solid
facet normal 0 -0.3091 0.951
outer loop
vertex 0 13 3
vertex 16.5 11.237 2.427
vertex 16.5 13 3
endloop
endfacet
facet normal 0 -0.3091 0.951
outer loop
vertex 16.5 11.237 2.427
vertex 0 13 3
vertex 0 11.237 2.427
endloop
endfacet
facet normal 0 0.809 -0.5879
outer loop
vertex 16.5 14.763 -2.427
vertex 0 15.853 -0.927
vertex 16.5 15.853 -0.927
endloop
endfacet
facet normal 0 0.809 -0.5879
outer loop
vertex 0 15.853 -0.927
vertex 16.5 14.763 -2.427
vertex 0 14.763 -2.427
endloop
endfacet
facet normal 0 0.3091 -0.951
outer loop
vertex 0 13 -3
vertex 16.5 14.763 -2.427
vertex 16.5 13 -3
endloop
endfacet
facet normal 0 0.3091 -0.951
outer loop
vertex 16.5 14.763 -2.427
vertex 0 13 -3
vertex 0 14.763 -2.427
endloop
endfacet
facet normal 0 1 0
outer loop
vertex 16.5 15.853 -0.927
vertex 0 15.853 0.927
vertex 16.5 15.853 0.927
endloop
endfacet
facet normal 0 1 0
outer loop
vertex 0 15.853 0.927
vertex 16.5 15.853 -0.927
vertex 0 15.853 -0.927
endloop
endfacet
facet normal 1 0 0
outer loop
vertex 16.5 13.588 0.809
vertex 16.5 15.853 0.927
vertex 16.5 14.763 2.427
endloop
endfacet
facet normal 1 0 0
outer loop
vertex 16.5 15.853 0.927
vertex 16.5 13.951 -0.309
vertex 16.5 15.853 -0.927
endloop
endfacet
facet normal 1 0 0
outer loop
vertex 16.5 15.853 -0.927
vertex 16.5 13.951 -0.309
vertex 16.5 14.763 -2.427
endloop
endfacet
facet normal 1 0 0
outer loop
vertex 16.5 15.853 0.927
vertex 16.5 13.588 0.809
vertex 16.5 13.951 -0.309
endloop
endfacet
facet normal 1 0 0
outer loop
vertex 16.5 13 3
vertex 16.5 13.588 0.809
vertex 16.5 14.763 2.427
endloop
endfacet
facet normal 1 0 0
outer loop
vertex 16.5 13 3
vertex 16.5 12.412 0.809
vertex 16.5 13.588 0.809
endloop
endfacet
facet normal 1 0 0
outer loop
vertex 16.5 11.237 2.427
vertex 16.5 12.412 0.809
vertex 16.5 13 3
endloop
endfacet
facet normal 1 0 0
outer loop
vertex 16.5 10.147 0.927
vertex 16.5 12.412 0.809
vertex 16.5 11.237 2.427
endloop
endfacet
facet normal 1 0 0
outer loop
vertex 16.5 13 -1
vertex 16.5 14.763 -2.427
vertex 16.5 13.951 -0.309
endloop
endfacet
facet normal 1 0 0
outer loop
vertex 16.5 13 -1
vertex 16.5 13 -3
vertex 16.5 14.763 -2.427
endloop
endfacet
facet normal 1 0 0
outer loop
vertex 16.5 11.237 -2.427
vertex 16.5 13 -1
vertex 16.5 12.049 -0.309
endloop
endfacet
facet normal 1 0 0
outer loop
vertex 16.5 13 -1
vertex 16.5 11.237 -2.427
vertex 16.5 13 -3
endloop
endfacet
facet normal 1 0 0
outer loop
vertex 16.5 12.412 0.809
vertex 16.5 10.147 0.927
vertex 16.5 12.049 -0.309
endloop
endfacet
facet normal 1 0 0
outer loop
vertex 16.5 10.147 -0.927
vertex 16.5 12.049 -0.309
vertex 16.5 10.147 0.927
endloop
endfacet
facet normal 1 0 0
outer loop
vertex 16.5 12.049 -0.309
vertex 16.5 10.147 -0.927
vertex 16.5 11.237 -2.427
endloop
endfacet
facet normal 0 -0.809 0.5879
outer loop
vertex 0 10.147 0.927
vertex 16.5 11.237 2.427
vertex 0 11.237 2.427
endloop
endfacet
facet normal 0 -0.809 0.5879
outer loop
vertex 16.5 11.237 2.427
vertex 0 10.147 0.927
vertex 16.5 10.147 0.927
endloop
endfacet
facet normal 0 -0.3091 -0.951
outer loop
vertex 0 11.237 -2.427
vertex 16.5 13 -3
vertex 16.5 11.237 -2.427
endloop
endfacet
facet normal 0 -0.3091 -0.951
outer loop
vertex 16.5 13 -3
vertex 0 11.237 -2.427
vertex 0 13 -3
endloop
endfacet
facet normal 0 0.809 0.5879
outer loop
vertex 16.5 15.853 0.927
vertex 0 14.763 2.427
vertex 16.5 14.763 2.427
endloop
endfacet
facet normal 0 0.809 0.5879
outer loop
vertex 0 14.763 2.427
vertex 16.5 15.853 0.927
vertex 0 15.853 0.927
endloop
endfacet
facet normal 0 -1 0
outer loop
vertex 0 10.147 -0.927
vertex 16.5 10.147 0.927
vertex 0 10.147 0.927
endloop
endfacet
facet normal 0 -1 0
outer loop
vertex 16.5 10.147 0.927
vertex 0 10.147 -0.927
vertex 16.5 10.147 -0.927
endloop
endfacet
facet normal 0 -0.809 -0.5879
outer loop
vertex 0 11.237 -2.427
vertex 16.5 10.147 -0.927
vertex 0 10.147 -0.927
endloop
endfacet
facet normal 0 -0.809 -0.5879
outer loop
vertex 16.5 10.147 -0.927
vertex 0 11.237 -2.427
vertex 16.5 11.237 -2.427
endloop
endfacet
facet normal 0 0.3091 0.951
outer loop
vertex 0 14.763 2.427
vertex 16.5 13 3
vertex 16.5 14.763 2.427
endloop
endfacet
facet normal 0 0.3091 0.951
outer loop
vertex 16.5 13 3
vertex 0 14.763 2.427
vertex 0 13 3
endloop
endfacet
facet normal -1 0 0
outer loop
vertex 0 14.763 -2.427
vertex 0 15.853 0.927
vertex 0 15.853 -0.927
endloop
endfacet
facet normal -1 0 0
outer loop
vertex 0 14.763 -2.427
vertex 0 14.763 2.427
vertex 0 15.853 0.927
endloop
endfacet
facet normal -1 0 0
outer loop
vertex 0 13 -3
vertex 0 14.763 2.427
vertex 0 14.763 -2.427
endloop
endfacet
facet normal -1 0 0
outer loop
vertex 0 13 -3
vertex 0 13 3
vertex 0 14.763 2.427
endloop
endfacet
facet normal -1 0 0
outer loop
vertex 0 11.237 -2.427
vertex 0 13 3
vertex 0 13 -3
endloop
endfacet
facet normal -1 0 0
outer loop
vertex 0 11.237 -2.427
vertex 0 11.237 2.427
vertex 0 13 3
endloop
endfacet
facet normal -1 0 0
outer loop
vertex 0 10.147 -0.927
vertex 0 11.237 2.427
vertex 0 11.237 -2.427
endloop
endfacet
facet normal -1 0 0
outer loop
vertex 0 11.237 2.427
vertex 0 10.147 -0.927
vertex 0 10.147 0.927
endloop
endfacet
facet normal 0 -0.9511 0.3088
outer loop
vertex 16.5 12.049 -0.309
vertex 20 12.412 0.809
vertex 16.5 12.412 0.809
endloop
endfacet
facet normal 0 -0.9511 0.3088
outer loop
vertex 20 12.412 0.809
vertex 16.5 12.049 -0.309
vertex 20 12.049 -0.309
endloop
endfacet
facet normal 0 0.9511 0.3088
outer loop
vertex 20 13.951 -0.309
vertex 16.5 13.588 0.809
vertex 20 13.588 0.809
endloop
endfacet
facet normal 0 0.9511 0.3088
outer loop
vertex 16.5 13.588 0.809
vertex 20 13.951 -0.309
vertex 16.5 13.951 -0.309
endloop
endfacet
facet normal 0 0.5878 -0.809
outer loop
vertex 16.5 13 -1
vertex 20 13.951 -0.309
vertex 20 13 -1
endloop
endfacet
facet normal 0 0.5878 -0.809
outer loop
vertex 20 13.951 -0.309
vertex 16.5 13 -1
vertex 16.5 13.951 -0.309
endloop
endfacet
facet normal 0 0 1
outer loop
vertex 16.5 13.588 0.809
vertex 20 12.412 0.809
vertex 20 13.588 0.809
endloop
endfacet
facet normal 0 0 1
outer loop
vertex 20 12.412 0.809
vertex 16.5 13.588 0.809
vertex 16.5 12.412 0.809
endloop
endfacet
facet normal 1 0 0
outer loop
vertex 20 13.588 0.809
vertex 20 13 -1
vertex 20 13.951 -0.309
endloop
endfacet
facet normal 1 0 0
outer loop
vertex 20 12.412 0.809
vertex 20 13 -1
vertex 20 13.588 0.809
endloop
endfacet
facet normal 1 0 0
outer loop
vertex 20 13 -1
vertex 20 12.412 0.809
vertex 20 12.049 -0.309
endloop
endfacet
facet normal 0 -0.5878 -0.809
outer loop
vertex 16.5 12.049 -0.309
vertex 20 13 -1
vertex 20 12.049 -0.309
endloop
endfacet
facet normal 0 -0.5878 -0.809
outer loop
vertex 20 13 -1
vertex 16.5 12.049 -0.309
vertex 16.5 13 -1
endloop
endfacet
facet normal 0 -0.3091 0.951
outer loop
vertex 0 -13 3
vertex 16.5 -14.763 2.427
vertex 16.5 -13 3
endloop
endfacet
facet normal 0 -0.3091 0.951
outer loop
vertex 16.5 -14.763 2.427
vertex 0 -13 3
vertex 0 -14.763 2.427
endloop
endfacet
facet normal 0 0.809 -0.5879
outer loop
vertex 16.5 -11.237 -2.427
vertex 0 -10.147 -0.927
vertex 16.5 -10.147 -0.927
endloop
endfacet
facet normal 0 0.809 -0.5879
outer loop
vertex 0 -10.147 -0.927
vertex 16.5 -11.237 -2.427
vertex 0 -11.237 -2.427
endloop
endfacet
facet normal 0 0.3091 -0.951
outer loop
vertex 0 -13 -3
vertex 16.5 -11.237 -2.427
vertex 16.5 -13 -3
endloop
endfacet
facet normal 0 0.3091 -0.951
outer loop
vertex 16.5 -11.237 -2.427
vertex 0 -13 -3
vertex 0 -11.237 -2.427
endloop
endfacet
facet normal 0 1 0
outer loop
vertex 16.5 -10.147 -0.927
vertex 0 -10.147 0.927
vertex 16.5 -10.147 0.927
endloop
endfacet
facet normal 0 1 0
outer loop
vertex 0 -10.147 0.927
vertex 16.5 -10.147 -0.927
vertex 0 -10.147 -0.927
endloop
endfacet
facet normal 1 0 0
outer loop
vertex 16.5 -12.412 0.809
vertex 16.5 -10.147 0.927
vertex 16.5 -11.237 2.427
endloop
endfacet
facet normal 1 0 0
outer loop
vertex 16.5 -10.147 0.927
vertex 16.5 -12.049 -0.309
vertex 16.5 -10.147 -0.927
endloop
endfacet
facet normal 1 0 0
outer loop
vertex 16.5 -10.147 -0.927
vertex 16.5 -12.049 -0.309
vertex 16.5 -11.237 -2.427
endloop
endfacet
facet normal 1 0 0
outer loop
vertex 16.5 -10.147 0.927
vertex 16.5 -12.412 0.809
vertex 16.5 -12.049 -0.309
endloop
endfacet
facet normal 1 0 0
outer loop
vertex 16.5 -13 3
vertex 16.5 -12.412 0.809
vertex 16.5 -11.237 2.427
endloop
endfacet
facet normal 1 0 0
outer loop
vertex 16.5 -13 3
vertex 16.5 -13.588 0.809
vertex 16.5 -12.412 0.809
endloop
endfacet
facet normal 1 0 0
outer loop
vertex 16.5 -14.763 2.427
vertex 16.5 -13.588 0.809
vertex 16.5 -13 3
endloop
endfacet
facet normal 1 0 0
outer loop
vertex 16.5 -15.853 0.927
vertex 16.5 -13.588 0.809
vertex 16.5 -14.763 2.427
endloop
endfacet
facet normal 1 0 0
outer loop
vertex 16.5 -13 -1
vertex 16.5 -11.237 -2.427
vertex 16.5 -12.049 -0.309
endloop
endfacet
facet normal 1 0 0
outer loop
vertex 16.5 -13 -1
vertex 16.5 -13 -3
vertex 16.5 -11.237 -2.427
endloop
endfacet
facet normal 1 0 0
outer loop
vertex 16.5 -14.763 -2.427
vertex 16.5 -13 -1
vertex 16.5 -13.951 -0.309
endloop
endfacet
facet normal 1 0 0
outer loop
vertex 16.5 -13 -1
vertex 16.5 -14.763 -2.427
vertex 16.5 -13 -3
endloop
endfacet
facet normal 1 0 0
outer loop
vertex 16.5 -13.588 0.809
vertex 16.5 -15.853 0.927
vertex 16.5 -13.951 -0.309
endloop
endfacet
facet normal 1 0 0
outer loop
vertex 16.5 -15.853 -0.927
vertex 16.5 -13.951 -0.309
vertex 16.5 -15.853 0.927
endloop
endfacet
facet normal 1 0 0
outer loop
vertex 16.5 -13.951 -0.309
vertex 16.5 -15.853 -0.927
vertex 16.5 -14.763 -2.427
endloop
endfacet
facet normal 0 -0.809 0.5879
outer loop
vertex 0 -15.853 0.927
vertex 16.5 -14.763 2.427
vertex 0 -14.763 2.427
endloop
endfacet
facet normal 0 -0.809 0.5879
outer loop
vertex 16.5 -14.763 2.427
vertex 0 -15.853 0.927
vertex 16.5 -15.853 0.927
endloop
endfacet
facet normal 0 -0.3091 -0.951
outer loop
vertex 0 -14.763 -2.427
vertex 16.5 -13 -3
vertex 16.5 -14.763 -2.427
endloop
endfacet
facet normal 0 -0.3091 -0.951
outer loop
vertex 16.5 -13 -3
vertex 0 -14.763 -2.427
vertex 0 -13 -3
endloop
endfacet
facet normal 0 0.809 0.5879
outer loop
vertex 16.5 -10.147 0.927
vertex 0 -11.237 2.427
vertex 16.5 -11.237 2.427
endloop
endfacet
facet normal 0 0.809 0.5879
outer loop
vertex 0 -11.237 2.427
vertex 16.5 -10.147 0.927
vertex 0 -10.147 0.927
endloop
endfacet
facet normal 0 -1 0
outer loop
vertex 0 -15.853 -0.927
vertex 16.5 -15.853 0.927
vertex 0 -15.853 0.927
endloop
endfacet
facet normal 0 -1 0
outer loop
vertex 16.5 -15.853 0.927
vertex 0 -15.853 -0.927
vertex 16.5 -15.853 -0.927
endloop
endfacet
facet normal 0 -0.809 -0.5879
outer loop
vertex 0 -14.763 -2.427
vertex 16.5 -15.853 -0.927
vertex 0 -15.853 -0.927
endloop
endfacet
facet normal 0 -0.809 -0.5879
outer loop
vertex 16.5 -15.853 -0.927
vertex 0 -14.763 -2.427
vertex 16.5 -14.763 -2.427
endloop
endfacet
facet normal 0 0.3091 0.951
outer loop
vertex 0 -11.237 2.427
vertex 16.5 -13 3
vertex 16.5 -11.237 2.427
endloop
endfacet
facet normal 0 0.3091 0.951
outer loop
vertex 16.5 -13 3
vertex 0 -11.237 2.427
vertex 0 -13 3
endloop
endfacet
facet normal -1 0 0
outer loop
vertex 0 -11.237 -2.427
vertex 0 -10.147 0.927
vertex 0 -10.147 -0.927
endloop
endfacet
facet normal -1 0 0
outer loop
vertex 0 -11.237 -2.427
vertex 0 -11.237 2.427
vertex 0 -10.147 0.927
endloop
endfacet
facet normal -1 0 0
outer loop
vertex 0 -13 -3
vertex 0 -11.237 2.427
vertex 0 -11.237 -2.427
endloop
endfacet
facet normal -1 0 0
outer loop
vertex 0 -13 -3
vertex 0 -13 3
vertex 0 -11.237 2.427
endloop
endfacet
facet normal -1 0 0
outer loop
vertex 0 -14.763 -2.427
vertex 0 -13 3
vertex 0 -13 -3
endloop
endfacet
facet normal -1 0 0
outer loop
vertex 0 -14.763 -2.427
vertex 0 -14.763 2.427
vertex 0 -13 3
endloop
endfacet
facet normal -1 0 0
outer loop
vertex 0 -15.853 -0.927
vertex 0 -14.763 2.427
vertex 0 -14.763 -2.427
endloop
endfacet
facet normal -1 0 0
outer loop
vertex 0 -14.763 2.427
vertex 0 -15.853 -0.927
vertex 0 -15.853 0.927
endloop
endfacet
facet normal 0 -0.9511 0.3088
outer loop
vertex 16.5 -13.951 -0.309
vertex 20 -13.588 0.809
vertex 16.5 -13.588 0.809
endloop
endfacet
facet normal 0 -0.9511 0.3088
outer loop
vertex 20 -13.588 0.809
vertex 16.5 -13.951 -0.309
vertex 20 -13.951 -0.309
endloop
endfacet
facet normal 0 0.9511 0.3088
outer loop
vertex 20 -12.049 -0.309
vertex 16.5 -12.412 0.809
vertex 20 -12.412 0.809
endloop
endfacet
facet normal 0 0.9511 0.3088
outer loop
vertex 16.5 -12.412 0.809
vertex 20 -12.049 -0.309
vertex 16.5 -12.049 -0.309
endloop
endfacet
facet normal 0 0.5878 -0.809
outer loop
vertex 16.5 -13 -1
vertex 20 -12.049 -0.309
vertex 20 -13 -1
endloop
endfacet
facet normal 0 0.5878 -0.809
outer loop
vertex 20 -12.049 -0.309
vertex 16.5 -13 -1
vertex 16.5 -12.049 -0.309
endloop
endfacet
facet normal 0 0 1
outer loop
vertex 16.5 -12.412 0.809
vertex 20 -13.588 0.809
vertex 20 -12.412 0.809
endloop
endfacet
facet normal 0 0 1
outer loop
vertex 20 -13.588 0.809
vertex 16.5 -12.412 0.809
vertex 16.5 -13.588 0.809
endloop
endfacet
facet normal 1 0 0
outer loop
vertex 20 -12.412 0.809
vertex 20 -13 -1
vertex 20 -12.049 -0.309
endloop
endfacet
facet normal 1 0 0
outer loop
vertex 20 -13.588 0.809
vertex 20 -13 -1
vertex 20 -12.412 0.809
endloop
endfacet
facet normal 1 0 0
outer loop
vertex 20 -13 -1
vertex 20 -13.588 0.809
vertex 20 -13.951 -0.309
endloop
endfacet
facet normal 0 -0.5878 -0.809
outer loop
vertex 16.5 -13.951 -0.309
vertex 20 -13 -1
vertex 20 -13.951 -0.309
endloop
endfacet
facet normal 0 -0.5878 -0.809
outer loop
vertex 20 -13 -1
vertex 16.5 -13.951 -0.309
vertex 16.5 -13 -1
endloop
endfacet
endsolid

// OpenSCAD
front_axle_y = 13.0;
rear_axle_y = -13.0;


module motor_with_wheel()
{
    cylinder(r=3, h=16.5);
    translate([0,0,16.5]) 
        cylinder(r=1, h=3.5);
    // Wheel
    translate([0,0,12])
        %cylinder(r=6, h=8);
}

module motor_with_wheel_x()
{
    rotate([0,90,0])
        motor_with_wheel();
}

module main()
{
    translate([0, front_axle_y])
        motor_with_wheel_x();
    translate([0, rear_axle_y])
        motor_with_wheel_x();
    
}

main();
